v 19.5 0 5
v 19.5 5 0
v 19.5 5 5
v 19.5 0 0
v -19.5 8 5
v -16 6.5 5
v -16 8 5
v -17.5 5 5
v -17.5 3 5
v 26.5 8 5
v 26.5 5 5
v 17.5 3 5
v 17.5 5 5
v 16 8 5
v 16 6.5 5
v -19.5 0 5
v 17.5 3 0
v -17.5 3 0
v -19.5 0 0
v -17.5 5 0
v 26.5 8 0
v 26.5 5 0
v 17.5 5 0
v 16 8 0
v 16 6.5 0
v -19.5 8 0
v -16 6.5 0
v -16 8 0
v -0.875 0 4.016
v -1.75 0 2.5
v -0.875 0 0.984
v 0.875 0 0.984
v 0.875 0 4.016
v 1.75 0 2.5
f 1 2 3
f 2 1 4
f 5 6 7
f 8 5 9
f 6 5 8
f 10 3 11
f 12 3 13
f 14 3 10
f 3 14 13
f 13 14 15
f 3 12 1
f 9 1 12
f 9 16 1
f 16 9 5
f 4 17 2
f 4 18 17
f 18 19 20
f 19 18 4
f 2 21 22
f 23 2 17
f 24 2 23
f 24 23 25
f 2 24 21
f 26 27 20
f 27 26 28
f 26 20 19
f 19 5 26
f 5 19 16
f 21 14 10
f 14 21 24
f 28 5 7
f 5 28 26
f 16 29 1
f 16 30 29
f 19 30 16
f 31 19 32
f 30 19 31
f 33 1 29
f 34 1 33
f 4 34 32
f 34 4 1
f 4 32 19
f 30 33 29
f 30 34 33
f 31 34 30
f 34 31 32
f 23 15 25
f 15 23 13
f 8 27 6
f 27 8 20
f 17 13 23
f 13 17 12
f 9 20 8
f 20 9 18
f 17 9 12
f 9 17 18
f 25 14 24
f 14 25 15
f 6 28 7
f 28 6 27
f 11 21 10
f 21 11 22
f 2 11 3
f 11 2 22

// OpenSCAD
hole_space = 50;
hole_diameter = 3.5000000000;
height = 5;
thick = 2;

difference() {
	union() {
		difference() {
			translate(v = [0, ((2 + (3 * thick)) / 2), 0]) {
				translate(v = [0, 0, (height / 2)]) {
					cube(center = true, size = [(35 + (2 * thick)), (2 + (3 * thick)), height]);
				}
			}
			translate(v = [0, 13.7500000000, 0]) {
				translate(v = [0, -8.7500000000, 0]) {
					translate(v = [-17.5000000000, 0, 0]) {
						linear_extrude(height = height) {
							polygon(points = [[0, 0], [35, 0], [17.5000000000, 17.5000000000]]);
						}
					}
				}
			}
			translate(v = [0, 4.0000000000, 0]) {
				translate(v = [0, 0, (height / 2)]) {
					cube(center = true, size = [35, 2, height]);
				}
			}
			translate(v = [0, 8, 0]) {
				translate(v = [0, 0, (height / 2)]) {
					cube(center = true, size = [32, 3, height]);
				}
			}
		}
		translate(v = [0, ((1.5 + (2 + (3 * thick))) - 3), 0]) {
			translate(v = [22.0000000000, 0, 0]) {
				translate(v = [0, 0, (height / 2)]) {
					cube(center = true, size = [9, 3, height]);
				}
			}
		}
	}
	translate(v = [0, 0, (height / 2)]) {
		rotate(a = [90, 0, 0]) {
			cylinder(d = hole_diameter, h = 3);
		}
	}
}
